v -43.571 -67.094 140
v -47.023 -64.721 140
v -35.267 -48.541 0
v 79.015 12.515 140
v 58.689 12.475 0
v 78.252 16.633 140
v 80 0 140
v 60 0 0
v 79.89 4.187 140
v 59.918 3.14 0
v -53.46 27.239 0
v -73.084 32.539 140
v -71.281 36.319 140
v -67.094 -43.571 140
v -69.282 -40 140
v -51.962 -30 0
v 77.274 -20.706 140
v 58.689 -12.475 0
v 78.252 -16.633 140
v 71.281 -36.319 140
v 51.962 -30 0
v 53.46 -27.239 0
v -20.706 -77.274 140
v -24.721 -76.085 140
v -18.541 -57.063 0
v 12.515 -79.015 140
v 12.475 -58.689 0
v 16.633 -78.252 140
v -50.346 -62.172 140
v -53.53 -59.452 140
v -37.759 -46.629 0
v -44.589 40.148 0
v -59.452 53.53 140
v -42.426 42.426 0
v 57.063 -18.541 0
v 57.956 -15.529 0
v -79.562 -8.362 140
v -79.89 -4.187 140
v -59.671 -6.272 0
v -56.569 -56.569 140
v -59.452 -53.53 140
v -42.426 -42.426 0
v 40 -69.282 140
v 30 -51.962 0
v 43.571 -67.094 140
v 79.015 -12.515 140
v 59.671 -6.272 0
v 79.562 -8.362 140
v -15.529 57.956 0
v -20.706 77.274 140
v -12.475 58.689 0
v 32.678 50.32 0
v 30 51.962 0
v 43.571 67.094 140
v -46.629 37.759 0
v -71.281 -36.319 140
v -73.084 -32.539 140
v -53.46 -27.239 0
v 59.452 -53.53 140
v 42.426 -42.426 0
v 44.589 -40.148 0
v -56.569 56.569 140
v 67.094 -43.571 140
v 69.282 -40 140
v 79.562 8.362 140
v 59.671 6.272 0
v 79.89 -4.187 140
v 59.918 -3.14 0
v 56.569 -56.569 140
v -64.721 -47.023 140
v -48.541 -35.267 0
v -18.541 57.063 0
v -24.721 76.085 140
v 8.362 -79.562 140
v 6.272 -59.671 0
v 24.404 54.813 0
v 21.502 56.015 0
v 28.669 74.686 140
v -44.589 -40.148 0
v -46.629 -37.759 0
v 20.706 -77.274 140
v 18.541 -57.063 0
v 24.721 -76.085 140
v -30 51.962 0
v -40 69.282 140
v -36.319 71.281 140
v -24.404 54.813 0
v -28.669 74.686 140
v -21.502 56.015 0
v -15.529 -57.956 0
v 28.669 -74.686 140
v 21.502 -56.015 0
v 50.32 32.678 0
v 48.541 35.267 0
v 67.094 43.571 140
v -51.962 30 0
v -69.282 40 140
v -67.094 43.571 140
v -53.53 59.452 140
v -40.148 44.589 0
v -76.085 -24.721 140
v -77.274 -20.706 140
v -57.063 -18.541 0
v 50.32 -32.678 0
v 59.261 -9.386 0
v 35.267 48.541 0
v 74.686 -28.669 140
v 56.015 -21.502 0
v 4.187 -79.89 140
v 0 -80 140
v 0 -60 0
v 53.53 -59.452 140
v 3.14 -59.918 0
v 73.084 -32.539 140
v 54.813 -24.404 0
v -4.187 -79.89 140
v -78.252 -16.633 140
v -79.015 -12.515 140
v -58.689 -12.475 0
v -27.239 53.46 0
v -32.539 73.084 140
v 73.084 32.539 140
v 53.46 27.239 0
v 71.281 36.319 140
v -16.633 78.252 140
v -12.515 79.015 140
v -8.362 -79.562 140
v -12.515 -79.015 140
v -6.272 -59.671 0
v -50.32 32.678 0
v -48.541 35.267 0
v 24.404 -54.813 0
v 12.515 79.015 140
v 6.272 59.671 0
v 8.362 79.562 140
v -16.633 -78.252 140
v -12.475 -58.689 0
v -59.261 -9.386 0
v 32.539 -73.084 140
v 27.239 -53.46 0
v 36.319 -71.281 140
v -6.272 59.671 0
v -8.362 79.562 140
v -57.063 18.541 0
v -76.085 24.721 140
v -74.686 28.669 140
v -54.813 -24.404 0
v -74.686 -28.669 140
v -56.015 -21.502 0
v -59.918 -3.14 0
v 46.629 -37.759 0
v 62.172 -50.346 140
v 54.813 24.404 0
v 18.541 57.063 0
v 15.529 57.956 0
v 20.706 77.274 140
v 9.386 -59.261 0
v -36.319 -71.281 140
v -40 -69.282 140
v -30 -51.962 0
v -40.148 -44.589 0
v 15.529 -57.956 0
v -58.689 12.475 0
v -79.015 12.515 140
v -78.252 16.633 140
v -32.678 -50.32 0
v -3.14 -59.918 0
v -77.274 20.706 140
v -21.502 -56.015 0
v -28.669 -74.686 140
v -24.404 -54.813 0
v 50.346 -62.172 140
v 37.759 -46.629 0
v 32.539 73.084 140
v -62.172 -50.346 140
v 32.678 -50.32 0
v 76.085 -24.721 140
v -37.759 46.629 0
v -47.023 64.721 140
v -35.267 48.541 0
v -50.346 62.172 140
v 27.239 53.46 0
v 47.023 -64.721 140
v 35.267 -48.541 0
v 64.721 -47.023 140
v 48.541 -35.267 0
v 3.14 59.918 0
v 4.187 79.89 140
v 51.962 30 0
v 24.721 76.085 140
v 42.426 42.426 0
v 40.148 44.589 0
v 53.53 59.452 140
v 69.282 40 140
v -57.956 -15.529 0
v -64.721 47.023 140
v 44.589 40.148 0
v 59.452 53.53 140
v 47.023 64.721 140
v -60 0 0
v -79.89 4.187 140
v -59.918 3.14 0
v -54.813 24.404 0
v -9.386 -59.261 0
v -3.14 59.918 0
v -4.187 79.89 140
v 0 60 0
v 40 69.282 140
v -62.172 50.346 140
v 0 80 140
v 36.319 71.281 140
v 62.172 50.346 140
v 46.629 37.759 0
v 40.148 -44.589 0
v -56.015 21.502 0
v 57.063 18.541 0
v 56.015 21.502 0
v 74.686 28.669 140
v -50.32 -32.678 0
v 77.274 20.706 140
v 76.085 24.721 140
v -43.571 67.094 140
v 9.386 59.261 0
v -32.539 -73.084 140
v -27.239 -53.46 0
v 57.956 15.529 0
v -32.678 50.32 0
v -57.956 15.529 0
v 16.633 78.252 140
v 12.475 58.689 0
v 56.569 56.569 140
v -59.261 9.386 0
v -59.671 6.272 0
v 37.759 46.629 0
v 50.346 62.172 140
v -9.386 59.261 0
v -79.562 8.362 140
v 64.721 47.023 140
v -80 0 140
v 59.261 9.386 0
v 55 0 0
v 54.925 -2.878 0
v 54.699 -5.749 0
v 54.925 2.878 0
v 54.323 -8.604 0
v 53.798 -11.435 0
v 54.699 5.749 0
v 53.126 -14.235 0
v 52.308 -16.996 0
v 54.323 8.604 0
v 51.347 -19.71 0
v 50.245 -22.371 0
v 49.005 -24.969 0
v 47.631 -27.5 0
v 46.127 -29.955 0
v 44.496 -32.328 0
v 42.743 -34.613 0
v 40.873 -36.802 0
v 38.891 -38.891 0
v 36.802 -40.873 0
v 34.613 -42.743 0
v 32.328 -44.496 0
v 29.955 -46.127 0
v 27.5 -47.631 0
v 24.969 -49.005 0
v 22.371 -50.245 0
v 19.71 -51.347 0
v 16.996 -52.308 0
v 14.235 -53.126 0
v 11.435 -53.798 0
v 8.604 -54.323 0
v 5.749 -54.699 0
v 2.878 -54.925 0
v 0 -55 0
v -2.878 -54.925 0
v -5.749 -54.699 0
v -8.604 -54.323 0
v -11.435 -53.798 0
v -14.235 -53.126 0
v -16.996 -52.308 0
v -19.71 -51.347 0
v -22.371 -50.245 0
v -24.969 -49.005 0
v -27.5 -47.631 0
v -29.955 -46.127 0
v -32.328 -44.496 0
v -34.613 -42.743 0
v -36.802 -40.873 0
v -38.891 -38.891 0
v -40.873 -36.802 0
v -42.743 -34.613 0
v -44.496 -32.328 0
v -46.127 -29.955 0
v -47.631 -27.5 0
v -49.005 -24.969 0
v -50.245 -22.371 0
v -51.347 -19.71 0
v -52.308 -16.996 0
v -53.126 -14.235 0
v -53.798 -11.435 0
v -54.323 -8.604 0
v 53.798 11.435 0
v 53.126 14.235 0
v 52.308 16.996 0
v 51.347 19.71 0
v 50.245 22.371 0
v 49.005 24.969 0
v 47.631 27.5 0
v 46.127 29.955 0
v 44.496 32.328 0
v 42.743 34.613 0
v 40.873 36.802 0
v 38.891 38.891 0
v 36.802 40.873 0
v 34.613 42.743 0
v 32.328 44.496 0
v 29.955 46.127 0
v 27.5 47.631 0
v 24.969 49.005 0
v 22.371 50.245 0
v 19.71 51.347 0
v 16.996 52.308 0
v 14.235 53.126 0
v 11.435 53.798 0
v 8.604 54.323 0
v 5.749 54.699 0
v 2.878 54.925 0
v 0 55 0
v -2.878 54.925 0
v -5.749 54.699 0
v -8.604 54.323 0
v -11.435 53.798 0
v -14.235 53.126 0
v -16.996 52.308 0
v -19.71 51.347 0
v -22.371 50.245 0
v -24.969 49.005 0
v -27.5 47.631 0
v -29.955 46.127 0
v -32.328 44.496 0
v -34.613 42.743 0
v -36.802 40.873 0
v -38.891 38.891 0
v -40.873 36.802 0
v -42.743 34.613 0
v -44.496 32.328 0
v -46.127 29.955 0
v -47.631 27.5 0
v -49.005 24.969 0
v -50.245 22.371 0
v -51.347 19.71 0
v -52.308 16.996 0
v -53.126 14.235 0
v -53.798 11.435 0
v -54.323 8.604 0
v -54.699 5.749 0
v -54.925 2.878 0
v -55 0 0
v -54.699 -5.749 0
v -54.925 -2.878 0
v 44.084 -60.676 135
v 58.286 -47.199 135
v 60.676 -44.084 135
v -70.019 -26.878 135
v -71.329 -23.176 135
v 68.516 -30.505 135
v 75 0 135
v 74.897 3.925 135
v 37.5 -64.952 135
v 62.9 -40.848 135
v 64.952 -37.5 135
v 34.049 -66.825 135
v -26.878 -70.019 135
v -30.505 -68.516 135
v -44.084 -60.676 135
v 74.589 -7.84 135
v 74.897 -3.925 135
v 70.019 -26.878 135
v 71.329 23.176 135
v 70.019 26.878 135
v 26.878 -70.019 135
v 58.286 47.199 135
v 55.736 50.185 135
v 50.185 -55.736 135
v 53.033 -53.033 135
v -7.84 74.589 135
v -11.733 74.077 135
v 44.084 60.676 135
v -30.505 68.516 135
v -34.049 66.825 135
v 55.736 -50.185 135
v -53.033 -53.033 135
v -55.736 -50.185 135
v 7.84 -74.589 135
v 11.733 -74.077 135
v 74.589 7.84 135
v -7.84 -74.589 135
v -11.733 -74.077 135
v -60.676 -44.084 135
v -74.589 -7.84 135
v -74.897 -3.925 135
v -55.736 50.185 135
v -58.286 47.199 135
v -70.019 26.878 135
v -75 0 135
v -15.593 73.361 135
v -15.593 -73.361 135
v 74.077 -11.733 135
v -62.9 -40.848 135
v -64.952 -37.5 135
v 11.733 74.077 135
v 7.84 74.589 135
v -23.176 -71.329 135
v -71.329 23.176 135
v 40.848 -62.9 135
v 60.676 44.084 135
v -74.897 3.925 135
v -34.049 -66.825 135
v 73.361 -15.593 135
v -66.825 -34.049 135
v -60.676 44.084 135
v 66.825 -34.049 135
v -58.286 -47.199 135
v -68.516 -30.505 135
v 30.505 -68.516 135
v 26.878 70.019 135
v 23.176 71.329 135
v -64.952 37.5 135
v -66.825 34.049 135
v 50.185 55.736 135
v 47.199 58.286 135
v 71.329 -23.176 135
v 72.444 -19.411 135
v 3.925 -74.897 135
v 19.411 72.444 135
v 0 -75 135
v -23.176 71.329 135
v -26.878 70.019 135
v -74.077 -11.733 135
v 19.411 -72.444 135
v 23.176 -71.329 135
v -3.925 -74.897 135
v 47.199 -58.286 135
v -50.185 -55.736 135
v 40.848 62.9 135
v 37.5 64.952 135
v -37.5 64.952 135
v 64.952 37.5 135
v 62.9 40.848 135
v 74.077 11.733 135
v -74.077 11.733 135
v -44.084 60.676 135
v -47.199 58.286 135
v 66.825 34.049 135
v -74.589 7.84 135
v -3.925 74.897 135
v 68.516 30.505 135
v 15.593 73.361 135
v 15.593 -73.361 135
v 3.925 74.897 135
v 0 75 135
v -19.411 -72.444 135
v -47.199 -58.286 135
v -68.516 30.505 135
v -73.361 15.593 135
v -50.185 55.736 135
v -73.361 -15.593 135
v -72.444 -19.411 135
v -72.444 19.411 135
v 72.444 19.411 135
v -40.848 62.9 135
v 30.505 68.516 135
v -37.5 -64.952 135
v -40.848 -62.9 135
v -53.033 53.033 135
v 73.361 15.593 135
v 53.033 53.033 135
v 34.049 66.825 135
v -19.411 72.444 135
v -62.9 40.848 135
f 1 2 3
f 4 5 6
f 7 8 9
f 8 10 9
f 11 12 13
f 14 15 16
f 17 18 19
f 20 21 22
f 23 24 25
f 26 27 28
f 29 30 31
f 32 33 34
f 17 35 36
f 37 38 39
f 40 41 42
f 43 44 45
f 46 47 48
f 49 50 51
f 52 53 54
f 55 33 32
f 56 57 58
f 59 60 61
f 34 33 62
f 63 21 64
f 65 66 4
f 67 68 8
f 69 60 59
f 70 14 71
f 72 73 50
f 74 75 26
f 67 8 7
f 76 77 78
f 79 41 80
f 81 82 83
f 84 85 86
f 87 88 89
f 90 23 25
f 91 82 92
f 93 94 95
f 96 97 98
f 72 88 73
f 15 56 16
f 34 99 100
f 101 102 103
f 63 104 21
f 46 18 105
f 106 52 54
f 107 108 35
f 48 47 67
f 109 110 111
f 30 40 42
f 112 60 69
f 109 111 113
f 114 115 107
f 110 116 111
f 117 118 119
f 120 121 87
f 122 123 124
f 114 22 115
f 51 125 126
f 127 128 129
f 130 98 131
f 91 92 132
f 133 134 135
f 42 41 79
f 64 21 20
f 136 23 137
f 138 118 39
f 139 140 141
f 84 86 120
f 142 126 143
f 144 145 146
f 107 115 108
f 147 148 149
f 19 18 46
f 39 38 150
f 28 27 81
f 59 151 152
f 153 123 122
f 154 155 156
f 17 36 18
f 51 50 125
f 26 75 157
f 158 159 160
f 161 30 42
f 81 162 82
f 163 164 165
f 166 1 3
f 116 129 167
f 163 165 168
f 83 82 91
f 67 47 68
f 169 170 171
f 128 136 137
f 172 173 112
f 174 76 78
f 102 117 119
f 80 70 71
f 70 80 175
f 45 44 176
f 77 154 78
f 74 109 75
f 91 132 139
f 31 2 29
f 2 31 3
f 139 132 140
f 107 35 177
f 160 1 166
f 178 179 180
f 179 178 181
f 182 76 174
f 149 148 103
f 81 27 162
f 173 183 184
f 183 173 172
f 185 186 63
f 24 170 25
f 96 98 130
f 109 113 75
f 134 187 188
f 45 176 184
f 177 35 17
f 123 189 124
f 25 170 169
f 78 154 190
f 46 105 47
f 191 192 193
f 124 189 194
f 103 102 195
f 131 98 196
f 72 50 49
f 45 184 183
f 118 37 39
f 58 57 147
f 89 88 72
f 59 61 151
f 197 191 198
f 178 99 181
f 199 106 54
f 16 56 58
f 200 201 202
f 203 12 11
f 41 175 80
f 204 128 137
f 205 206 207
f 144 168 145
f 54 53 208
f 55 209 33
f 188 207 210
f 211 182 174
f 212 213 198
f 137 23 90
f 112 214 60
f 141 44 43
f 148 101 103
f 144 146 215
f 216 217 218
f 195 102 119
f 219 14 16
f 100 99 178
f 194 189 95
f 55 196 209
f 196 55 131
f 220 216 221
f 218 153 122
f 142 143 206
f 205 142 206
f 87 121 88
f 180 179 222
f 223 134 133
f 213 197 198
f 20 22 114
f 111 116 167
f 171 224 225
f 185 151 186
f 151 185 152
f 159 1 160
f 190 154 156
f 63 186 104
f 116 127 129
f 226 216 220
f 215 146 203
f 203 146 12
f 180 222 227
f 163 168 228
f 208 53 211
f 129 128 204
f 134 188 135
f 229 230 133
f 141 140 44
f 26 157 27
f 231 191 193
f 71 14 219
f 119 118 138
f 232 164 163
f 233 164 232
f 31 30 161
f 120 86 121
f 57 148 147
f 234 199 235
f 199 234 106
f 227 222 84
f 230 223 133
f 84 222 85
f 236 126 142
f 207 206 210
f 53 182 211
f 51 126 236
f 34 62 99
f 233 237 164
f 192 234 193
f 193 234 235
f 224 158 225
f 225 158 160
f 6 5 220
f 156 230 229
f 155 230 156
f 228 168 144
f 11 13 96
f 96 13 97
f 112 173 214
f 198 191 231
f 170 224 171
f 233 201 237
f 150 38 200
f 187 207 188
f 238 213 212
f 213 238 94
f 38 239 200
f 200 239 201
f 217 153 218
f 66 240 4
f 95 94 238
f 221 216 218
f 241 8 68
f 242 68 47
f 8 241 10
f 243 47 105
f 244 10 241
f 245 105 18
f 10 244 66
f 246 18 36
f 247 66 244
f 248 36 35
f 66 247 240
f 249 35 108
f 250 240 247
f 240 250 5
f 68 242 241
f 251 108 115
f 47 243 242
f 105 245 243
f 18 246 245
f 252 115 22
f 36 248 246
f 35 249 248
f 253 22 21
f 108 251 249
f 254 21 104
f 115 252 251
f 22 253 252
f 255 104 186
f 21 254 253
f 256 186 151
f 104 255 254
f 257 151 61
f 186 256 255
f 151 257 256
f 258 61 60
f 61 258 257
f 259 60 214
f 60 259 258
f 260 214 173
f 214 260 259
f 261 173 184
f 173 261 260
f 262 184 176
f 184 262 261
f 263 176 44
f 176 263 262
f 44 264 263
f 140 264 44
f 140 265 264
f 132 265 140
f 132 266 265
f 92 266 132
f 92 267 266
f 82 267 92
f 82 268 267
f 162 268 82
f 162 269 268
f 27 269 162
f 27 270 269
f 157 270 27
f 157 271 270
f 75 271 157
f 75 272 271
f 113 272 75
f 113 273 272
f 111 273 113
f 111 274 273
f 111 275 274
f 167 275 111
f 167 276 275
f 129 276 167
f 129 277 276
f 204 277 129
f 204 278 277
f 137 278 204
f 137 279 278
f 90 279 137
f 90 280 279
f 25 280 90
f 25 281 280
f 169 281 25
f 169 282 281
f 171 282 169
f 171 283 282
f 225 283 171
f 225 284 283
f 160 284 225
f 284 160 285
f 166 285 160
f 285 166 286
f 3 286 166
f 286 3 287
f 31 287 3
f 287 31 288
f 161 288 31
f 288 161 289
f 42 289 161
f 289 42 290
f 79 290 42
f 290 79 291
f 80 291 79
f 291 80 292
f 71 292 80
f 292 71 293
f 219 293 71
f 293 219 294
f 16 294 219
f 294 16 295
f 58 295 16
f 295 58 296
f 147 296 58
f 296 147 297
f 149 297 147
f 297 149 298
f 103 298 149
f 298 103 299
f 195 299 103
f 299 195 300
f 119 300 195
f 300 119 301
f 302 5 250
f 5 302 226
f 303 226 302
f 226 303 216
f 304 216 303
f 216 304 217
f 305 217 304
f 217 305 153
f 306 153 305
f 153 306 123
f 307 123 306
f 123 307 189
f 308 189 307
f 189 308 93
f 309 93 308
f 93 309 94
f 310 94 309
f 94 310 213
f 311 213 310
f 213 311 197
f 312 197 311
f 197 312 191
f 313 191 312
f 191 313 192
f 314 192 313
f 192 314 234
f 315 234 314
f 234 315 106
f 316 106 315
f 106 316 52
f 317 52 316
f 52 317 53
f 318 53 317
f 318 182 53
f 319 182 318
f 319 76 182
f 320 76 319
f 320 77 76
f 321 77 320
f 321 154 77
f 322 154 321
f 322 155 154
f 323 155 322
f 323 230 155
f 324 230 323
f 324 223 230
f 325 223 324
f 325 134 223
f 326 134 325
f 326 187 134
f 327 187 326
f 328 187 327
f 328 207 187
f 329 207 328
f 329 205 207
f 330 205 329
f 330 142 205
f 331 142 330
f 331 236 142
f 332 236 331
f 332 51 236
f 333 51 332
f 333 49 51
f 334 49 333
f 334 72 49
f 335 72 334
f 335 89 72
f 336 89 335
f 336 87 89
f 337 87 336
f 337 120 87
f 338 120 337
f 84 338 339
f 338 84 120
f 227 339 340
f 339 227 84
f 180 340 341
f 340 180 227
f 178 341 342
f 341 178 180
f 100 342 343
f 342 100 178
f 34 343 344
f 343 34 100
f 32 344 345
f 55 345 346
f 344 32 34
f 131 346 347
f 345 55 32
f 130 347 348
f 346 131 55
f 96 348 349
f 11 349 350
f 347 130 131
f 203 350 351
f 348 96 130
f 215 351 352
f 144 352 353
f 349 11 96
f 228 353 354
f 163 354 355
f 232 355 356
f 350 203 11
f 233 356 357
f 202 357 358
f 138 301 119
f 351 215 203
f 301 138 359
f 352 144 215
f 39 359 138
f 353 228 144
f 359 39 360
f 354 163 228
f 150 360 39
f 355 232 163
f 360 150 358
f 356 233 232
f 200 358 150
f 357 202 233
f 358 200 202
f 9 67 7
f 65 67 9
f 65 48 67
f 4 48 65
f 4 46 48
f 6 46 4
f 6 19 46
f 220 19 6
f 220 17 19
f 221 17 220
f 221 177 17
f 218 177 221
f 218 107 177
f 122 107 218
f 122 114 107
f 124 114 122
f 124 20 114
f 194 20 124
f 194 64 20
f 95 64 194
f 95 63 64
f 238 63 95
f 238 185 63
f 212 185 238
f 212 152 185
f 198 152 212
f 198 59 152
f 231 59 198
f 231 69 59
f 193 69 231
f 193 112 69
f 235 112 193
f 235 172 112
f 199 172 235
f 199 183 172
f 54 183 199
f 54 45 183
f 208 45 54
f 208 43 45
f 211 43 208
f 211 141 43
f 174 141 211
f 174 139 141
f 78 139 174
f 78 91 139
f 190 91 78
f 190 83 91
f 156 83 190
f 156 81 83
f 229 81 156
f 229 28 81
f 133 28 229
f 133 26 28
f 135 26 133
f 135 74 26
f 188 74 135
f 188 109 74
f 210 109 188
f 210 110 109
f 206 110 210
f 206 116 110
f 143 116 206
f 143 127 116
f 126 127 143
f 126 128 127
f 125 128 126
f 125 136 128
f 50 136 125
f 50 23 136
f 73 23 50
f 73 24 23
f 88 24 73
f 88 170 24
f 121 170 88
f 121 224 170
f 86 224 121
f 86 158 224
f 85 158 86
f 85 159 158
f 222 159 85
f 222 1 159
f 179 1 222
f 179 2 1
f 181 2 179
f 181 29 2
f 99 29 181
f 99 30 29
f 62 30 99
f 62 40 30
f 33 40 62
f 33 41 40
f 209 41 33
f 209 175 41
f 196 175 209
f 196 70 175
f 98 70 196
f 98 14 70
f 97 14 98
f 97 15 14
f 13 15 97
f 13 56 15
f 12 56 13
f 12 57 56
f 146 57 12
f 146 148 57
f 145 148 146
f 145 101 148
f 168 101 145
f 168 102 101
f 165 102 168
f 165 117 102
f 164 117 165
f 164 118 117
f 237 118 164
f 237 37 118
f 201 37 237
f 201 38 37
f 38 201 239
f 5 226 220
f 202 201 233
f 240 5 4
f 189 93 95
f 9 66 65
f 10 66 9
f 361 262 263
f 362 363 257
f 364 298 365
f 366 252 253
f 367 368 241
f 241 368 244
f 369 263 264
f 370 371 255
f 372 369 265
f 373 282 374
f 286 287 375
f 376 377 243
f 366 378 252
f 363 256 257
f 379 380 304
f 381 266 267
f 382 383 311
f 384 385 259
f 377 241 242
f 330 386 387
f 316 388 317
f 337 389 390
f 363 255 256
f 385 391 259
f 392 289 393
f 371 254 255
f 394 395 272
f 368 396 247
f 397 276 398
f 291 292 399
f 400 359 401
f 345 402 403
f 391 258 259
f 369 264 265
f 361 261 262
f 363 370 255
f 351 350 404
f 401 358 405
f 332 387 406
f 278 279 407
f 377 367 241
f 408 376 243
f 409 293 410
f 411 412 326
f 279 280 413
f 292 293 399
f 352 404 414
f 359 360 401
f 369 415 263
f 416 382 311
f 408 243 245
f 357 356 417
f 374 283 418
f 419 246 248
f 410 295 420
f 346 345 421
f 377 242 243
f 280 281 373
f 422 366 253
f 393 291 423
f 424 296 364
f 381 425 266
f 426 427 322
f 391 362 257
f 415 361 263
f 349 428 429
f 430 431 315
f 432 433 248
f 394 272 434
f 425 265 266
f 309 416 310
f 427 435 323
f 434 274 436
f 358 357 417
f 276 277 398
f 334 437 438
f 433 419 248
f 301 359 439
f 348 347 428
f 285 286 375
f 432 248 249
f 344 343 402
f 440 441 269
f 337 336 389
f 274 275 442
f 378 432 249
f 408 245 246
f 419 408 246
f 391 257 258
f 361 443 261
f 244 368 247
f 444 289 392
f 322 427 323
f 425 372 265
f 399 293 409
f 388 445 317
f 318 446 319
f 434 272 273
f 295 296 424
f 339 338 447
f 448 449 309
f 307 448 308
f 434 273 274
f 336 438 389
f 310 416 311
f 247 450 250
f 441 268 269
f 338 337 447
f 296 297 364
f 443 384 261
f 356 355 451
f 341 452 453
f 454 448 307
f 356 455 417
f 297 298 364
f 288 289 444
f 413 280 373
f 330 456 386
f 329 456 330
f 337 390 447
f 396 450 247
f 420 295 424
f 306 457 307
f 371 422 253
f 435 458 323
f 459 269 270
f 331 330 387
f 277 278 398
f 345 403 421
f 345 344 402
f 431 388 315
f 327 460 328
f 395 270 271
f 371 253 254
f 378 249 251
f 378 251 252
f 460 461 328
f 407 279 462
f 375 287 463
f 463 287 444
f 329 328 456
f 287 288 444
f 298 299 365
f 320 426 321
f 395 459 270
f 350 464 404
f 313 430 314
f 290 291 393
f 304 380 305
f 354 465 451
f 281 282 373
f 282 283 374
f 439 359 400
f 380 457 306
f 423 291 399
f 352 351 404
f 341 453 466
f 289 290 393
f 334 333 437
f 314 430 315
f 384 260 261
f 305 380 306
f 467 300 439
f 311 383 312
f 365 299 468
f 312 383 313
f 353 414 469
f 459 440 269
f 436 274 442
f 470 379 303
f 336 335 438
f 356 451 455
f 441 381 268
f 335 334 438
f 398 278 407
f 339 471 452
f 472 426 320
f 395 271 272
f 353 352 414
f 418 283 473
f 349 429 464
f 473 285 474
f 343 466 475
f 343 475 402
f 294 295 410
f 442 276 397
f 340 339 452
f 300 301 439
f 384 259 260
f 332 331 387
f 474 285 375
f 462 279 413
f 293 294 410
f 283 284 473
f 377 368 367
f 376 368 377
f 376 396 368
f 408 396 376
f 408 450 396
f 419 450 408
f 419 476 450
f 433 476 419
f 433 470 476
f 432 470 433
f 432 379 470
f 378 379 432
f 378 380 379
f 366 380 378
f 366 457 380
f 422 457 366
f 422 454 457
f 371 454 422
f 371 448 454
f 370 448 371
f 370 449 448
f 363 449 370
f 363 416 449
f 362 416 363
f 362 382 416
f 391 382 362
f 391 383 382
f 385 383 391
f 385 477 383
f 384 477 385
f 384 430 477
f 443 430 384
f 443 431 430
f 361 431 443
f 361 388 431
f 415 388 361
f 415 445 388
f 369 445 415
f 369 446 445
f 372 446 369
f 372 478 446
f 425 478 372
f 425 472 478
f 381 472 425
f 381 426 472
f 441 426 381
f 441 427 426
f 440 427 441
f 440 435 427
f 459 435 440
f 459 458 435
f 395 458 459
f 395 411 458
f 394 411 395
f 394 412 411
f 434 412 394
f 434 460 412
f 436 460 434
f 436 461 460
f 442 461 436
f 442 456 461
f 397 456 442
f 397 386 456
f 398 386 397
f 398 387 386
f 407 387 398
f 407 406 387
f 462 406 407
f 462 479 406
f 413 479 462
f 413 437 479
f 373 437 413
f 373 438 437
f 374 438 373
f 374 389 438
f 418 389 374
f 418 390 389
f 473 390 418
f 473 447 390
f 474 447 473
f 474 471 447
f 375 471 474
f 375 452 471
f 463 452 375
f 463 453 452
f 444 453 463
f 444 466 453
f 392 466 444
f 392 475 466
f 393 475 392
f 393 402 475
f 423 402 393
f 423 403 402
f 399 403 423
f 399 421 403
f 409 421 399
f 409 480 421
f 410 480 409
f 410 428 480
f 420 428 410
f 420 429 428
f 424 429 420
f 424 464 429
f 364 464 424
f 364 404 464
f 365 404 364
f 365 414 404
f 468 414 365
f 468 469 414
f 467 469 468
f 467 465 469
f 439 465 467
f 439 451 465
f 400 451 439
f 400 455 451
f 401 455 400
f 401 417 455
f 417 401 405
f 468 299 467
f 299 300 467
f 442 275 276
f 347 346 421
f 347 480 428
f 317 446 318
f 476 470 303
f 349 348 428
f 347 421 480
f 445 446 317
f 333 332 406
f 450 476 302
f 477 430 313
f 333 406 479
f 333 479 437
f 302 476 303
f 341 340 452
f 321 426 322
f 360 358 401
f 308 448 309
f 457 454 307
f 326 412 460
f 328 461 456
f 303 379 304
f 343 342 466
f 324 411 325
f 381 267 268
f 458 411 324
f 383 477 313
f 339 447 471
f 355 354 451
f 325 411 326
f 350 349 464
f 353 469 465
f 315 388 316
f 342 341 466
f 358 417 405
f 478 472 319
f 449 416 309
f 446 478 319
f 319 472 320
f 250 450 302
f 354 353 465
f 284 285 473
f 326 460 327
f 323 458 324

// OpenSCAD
module pot(
		rBottom = 60,
		rTop = 80,
		height = 140,
		wall = 5,
		fn = 120) {
	difference() {
		cylinder(h = height,r1 = rBottom,r2 = rTop,$fn = fn);
		cylinder(h = height - wall,r1 = rBottom - wall,r2 = rTop - wall,$fn = fn);
	}
}

pot();
